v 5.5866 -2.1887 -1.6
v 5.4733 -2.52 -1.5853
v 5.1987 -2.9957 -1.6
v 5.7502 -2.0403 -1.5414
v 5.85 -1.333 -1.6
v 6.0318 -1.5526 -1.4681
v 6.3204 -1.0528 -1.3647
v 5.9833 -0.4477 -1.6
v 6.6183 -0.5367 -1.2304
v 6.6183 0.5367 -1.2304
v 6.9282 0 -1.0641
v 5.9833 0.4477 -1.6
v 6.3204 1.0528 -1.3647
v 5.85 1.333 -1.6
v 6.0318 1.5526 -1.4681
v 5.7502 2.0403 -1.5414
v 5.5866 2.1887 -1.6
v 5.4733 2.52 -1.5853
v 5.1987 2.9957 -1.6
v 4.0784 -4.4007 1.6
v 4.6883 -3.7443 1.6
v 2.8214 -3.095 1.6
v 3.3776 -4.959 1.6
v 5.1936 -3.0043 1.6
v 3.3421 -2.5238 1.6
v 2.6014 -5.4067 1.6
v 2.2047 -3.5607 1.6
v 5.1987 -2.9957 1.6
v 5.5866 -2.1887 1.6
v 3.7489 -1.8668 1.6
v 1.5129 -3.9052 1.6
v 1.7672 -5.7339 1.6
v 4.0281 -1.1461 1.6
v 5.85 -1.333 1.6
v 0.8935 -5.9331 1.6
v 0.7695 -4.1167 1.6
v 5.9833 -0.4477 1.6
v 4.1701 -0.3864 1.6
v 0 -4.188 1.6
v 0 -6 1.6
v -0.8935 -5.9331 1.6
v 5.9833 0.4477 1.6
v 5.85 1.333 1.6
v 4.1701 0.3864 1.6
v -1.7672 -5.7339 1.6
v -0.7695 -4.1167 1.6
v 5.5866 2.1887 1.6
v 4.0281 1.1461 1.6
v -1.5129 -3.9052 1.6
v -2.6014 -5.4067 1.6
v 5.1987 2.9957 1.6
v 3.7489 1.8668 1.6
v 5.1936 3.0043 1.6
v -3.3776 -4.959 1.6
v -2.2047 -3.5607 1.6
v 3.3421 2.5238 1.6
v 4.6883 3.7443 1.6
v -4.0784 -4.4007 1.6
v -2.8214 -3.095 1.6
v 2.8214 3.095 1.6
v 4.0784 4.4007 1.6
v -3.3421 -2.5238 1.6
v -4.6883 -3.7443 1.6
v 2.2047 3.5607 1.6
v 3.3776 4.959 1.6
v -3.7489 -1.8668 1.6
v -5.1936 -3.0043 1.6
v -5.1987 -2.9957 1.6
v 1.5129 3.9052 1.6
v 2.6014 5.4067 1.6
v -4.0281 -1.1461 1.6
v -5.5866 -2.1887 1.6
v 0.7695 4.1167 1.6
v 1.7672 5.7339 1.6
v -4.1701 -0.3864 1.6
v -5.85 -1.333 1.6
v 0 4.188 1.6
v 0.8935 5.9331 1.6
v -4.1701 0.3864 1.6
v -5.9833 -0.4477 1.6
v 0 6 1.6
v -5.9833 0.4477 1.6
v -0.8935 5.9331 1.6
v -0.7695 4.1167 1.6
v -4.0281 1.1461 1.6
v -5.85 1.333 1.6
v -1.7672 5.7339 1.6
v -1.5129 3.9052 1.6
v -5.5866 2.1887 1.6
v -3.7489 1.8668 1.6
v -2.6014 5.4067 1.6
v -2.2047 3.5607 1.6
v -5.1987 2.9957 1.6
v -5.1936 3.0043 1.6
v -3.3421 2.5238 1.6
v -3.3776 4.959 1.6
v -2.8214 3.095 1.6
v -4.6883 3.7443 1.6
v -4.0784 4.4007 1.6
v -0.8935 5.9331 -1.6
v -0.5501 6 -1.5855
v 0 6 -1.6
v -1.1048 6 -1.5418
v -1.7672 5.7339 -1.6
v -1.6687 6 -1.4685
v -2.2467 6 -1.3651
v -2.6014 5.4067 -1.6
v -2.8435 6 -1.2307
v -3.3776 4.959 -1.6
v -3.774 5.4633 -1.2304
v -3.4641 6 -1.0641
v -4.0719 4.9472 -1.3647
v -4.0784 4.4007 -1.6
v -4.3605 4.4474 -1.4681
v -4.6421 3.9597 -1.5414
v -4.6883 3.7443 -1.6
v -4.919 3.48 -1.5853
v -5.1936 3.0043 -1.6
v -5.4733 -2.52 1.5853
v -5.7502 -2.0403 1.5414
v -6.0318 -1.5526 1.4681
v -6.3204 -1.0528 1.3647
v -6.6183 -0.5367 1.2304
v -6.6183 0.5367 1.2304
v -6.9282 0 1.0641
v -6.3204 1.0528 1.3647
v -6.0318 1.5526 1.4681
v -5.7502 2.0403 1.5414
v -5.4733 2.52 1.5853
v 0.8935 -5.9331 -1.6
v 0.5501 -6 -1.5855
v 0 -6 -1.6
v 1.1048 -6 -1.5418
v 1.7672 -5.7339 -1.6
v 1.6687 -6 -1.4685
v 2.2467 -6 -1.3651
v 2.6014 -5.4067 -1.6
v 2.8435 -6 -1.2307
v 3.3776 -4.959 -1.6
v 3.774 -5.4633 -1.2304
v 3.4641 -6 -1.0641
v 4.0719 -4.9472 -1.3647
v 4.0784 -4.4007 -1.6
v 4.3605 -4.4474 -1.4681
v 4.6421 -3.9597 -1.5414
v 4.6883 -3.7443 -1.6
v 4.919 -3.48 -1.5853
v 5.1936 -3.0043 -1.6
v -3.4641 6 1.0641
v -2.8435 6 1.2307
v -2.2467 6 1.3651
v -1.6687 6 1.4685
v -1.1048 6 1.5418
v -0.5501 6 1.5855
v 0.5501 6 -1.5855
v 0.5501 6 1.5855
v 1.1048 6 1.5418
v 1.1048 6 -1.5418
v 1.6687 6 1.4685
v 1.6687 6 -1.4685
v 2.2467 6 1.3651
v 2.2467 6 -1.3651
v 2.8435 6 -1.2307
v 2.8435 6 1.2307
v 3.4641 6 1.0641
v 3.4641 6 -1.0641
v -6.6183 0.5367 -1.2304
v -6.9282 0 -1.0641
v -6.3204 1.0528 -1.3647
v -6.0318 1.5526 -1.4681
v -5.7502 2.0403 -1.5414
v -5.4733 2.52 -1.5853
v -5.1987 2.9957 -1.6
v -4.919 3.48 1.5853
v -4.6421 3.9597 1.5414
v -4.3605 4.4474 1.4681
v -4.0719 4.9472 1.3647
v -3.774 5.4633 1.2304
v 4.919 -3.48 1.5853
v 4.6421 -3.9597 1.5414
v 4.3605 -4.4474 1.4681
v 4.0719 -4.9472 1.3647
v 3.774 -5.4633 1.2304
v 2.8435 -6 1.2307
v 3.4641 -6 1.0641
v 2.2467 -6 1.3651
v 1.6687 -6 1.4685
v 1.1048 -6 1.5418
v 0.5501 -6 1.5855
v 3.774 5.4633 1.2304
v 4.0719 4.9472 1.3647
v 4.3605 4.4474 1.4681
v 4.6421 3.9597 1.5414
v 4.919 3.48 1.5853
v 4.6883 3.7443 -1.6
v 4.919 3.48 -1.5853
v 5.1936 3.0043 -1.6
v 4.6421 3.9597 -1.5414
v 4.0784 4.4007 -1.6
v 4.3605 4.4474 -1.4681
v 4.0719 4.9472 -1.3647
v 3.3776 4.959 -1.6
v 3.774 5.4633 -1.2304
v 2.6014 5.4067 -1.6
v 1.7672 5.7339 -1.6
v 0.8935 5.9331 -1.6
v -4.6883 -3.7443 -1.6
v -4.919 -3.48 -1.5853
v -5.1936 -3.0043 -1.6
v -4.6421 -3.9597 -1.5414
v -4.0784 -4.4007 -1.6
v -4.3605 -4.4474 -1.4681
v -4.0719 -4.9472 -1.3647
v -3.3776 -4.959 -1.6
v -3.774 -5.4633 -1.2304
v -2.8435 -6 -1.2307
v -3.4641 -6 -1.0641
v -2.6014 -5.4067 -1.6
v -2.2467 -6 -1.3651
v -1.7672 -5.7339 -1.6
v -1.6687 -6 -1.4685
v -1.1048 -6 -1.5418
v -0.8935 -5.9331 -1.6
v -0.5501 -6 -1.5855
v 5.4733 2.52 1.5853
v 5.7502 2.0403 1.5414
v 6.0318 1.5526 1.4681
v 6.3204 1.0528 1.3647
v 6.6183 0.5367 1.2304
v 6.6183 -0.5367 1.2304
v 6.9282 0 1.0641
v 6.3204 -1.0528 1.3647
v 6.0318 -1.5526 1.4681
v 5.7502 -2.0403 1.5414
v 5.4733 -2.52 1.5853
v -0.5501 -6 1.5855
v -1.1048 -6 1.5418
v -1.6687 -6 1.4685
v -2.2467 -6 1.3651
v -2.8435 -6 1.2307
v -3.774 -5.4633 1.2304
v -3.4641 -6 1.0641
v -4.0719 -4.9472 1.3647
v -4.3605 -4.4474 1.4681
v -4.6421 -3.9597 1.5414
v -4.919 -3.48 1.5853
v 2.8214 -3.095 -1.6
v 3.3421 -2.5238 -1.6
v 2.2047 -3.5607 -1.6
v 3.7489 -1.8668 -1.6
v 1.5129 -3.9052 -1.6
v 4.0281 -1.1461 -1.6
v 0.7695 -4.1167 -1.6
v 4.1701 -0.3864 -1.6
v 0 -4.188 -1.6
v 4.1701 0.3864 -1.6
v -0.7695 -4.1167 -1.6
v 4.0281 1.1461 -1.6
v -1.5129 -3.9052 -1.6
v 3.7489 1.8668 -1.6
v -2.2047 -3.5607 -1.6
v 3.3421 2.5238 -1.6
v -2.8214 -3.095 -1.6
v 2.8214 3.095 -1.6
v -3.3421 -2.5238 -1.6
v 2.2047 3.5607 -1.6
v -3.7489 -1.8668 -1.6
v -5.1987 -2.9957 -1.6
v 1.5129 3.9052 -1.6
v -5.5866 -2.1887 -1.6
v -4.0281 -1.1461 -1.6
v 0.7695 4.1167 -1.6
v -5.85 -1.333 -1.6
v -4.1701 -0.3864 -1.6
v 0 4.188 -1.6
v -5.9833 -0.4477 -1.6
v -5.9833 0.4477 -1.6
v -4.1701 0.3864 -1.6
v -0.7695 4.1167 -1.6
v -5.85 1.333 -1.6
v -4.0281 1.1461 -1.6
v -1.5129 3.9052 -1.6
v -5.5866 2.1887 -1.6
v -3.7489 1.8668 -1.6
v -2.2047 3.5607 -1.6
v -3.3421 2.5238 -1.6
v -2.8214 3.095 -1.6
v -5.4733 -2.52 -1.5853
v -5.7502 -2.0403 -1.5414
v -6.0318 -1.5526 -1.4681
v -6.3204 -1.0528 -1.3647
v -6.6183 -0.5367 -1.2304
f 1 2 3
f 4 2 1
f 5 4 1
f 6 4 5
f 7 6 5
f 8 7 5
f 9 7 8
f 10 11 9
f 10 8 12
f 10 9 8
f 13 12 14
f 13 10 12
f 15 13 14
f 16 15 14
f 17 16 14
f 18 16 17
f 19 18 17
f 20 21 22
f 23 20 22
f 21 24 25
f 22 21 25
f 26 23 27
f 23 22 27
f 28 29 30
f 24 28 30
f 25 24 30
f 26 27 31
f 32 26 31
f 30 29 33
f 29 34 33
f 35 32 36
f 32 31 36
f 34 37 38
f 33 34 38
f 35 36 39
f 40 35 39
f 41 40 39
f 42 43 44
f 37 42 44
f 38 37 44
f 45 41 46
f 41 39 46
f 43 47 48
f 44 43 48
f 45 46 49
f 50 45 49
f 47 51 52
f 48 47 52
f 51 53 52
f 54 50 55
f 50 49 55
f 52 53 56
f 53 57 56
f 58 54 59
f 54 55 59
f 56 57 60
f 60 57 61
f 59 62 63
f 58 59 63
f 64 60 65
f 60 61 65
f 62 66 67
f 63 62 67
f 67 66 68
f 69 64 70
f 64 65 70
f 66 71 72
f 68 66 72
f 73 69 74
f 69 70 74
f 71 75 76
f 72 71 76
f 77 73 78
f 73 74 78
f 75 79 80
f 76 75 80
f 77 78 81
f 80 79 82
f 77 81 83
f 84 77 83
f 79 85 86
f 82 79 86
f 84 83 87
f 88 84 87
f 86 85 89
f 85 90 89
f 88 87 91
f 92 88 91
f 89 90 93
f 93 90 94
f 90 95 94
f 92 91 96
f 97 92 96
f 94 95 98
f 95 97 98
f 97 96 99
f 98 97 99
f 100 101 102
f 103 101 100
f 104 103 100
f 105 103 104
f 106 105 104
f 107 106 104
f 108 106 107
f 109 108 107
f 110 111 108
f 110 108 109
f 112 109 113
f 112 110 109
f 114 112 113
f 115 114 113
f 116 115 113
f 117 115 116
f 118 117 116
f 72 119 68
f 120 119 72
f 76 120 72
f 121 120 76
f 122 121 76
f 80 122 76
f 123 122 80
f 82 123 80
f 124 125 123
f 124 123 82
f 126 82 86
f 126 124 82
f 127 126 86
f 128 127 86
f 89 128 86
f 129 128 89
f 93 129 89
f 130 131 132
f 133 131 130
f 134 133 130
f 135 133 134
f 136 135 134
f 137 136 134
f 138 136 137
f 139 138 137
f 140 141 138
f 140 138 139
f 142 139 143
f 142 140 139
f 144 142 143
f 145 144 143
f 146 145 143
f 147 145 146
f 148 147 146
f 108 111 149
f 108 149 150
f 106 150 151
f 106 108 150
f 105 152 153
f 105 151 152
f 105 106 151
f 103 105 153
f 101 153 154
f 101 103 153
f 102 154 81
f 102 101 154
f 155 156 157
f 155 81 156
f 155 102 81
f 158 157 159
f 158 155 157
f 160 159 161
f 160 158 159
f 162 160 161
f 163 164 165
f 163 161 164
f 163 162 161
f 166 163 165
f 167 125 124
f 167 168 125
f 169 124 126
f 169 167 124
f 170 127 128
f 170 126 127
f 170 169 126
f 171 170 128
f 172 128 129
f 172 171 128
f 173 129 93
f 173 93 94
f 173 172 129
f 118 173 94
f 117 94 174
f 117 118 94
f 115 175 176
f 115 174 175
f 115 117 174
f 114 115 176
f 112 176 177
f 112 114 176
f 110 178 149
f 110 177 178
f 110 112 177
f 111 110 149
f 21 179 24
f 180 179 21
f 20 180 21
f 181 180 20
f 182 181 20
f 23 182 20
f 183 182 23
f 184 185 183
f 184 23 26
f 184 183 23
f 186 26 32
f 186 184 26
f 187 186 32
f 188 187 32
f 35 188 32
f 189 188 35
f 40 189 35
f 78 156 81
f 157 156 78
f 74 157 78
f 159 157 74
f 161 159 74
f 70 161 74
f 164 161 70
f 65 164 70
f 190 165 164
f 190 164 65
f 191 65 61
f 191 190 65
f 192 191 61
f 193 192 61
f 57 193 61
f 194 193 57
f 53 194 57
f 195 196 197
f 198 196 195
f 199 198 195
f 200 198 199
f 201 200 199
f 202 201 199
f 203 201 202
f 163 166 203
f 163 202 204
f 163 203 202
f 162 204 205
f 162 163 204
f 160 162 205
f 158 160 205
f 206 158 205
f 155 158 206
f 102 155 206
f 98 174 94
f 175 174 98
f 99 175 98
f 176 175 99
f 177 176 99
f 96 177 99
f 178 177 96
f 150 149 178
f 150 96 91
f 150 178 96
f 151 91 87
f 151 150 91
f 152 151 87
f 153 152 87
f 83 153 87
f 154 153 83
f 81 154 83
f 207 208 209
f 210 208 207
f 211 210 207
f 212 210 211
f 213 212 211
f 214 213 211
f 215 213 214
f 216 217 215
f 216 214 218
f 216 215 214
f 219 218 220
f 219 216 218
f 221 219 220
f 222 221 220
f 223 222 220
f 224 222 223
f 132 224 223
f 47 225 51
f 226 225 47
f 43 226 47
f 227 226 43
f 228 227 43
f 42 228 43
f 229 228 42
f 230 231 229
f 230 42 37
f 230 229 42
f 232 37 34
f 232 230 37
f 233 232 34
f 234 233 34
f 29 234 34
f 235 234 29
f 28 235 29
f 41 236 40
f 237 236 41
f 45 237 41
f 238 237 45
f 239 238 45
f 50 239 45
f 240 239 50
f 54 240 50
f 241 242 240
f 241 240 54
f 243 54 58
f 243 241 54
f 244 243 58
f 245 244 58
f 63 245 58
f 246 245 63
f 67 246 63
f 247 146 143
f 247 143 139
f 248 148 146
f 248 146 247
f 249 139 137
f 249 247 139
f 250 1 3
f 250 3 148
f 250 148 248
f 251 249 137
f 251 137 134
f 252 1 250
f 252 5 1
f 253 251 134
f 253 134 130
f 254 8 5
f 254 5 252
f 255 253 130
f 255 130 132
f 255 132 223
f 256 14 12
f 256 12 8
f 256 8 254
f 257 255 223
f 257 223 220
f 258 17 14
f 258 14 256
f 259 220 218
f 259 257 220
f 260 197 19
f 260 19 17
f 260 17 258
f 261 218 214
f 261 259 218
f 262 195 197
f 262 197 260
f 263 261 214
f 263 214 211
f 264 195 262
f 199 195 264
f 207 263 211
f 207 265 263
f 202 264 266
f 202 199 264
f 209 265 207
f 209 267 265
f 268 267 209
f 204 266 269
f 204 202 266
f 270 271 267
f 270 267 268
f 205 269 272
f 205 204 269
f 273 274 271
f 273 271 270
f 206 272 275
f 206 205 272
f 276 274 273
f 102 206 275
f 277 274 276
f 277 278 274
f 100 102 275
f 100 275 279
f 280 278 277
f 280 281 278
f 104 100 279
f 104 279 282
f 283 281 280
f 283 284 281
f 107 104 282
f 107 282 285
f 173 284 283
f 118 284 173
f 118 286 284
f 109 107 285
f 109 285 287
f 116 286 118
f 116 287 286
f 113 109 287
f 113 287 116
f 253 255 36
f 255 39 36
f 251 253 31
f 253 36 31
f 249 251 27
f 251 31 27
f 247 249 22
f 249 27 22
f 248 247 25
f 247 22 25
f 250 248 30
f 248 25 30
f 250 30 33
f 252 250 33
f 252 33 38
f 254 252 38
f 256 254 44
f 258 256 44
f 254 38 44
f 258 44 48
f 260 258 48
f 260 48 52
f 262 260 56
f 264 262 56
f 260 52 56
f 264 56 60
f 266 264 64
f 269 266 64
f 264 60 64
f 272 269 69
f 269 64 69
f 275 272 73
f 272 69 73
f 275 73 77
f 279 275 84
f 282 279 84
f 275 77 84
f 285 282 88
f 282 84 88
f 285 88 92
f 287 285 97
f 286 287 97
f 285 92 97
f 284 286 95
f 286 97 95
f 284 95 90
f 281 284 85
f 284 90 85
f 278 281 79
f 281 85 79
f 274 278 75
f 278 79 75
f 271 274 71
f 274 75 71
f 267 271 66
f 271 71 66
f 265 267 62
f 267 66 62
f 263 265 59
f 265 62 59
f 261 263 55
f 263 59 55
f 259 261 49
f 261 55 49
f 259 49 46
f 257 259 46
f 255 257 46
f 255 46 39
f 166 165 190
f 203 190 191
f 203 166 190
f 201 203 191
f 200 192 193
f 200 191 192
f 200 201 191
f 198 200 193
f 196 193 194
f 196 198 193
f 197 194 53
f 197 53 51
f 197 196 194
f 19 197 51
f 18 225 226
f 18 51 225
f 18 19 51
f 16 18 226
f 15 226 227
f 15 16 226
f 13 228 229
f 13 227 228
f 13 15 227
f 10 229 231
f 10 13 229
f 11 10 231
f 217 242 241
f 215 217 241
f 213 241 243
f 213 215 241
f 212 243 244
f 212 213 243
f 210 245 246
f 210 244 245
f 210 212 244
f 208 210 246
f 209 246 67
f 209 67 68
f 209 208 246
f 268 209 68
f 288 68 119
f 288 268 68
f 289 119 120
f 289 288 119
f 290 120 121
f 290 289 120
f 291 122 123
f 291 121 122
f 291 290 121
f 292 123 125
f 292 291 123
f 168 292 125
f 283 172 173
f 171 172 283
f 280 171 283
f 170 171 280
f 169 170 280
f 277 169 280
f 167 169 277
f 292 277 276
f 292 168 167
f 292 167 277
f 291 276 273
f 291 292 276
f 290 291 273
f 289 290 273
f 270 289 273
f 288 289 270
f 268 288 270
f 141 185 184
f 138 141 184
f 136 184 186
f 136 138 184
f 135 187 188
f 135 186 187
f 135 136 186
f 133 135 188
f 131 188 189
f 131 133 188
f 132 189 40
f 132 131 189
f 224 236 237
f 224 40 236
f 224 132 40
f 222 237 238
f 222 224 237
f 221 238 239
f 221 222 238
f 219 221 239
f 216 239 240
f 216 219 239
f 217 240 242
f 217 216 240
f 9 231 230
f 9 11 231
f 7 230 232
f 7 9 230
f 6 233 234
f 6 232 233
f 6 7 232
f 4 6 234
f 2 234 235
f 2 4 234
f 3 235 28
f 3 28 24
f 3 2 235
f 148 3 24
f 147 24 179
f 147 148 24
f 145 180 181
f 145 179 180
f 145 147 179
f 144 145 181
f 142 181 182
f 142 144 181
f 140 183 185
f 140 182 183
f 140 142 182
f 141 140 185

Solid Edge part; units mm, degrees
sketch "Sketch1" plane through (10.8674, 10.8674, 0) normal (0, 0, 1) x (1, 0, 0)
  line L0 (-17.7956, -10.8674) -> (-14.3315, -4.8674)
  line L1 (-14.3315, -4.8674) -> (-7.4033, -4.8674)
  line L2 (-7.4033, -4.8674) -> (-3.9392, -10.8674)
  line L3 (-3.9392, -10.8674) -> (-7.4033, -16.8674)
  line L4 (-7.4033, -16.8674) -> (-14.3315, -16.8674)
  line L5 (-14.3315, -16.8674) -> (-17.7956, -10.8674)
  dimension "D1" = 12
extrude "Protrusion1" add sketch "Sketch1" along normal mid plane 3.2
sketch "Sketch2" plane through (0, 8.3963, 8.3963) normal (1, 0, 0) x (0, 1, 0)
  line L0 (-14.3963, -6.7963) -> (-17.1675, -8.3963)
  line L1 (-17.1675, -8.3963) -> (-14.3963, -9.9963)
revolve "RevolvedCutout1" cut sketch "Sketch2" angle 360 about axis through (0, 0, 1.6) along (0, 0, -1) material side at (0, -7.4106, 0.8433)
hole "Hål_M10" at (0, 0, 1.6) direction (0, 0, -1) diameter 8.376 end up to next
properties material "Iron"
